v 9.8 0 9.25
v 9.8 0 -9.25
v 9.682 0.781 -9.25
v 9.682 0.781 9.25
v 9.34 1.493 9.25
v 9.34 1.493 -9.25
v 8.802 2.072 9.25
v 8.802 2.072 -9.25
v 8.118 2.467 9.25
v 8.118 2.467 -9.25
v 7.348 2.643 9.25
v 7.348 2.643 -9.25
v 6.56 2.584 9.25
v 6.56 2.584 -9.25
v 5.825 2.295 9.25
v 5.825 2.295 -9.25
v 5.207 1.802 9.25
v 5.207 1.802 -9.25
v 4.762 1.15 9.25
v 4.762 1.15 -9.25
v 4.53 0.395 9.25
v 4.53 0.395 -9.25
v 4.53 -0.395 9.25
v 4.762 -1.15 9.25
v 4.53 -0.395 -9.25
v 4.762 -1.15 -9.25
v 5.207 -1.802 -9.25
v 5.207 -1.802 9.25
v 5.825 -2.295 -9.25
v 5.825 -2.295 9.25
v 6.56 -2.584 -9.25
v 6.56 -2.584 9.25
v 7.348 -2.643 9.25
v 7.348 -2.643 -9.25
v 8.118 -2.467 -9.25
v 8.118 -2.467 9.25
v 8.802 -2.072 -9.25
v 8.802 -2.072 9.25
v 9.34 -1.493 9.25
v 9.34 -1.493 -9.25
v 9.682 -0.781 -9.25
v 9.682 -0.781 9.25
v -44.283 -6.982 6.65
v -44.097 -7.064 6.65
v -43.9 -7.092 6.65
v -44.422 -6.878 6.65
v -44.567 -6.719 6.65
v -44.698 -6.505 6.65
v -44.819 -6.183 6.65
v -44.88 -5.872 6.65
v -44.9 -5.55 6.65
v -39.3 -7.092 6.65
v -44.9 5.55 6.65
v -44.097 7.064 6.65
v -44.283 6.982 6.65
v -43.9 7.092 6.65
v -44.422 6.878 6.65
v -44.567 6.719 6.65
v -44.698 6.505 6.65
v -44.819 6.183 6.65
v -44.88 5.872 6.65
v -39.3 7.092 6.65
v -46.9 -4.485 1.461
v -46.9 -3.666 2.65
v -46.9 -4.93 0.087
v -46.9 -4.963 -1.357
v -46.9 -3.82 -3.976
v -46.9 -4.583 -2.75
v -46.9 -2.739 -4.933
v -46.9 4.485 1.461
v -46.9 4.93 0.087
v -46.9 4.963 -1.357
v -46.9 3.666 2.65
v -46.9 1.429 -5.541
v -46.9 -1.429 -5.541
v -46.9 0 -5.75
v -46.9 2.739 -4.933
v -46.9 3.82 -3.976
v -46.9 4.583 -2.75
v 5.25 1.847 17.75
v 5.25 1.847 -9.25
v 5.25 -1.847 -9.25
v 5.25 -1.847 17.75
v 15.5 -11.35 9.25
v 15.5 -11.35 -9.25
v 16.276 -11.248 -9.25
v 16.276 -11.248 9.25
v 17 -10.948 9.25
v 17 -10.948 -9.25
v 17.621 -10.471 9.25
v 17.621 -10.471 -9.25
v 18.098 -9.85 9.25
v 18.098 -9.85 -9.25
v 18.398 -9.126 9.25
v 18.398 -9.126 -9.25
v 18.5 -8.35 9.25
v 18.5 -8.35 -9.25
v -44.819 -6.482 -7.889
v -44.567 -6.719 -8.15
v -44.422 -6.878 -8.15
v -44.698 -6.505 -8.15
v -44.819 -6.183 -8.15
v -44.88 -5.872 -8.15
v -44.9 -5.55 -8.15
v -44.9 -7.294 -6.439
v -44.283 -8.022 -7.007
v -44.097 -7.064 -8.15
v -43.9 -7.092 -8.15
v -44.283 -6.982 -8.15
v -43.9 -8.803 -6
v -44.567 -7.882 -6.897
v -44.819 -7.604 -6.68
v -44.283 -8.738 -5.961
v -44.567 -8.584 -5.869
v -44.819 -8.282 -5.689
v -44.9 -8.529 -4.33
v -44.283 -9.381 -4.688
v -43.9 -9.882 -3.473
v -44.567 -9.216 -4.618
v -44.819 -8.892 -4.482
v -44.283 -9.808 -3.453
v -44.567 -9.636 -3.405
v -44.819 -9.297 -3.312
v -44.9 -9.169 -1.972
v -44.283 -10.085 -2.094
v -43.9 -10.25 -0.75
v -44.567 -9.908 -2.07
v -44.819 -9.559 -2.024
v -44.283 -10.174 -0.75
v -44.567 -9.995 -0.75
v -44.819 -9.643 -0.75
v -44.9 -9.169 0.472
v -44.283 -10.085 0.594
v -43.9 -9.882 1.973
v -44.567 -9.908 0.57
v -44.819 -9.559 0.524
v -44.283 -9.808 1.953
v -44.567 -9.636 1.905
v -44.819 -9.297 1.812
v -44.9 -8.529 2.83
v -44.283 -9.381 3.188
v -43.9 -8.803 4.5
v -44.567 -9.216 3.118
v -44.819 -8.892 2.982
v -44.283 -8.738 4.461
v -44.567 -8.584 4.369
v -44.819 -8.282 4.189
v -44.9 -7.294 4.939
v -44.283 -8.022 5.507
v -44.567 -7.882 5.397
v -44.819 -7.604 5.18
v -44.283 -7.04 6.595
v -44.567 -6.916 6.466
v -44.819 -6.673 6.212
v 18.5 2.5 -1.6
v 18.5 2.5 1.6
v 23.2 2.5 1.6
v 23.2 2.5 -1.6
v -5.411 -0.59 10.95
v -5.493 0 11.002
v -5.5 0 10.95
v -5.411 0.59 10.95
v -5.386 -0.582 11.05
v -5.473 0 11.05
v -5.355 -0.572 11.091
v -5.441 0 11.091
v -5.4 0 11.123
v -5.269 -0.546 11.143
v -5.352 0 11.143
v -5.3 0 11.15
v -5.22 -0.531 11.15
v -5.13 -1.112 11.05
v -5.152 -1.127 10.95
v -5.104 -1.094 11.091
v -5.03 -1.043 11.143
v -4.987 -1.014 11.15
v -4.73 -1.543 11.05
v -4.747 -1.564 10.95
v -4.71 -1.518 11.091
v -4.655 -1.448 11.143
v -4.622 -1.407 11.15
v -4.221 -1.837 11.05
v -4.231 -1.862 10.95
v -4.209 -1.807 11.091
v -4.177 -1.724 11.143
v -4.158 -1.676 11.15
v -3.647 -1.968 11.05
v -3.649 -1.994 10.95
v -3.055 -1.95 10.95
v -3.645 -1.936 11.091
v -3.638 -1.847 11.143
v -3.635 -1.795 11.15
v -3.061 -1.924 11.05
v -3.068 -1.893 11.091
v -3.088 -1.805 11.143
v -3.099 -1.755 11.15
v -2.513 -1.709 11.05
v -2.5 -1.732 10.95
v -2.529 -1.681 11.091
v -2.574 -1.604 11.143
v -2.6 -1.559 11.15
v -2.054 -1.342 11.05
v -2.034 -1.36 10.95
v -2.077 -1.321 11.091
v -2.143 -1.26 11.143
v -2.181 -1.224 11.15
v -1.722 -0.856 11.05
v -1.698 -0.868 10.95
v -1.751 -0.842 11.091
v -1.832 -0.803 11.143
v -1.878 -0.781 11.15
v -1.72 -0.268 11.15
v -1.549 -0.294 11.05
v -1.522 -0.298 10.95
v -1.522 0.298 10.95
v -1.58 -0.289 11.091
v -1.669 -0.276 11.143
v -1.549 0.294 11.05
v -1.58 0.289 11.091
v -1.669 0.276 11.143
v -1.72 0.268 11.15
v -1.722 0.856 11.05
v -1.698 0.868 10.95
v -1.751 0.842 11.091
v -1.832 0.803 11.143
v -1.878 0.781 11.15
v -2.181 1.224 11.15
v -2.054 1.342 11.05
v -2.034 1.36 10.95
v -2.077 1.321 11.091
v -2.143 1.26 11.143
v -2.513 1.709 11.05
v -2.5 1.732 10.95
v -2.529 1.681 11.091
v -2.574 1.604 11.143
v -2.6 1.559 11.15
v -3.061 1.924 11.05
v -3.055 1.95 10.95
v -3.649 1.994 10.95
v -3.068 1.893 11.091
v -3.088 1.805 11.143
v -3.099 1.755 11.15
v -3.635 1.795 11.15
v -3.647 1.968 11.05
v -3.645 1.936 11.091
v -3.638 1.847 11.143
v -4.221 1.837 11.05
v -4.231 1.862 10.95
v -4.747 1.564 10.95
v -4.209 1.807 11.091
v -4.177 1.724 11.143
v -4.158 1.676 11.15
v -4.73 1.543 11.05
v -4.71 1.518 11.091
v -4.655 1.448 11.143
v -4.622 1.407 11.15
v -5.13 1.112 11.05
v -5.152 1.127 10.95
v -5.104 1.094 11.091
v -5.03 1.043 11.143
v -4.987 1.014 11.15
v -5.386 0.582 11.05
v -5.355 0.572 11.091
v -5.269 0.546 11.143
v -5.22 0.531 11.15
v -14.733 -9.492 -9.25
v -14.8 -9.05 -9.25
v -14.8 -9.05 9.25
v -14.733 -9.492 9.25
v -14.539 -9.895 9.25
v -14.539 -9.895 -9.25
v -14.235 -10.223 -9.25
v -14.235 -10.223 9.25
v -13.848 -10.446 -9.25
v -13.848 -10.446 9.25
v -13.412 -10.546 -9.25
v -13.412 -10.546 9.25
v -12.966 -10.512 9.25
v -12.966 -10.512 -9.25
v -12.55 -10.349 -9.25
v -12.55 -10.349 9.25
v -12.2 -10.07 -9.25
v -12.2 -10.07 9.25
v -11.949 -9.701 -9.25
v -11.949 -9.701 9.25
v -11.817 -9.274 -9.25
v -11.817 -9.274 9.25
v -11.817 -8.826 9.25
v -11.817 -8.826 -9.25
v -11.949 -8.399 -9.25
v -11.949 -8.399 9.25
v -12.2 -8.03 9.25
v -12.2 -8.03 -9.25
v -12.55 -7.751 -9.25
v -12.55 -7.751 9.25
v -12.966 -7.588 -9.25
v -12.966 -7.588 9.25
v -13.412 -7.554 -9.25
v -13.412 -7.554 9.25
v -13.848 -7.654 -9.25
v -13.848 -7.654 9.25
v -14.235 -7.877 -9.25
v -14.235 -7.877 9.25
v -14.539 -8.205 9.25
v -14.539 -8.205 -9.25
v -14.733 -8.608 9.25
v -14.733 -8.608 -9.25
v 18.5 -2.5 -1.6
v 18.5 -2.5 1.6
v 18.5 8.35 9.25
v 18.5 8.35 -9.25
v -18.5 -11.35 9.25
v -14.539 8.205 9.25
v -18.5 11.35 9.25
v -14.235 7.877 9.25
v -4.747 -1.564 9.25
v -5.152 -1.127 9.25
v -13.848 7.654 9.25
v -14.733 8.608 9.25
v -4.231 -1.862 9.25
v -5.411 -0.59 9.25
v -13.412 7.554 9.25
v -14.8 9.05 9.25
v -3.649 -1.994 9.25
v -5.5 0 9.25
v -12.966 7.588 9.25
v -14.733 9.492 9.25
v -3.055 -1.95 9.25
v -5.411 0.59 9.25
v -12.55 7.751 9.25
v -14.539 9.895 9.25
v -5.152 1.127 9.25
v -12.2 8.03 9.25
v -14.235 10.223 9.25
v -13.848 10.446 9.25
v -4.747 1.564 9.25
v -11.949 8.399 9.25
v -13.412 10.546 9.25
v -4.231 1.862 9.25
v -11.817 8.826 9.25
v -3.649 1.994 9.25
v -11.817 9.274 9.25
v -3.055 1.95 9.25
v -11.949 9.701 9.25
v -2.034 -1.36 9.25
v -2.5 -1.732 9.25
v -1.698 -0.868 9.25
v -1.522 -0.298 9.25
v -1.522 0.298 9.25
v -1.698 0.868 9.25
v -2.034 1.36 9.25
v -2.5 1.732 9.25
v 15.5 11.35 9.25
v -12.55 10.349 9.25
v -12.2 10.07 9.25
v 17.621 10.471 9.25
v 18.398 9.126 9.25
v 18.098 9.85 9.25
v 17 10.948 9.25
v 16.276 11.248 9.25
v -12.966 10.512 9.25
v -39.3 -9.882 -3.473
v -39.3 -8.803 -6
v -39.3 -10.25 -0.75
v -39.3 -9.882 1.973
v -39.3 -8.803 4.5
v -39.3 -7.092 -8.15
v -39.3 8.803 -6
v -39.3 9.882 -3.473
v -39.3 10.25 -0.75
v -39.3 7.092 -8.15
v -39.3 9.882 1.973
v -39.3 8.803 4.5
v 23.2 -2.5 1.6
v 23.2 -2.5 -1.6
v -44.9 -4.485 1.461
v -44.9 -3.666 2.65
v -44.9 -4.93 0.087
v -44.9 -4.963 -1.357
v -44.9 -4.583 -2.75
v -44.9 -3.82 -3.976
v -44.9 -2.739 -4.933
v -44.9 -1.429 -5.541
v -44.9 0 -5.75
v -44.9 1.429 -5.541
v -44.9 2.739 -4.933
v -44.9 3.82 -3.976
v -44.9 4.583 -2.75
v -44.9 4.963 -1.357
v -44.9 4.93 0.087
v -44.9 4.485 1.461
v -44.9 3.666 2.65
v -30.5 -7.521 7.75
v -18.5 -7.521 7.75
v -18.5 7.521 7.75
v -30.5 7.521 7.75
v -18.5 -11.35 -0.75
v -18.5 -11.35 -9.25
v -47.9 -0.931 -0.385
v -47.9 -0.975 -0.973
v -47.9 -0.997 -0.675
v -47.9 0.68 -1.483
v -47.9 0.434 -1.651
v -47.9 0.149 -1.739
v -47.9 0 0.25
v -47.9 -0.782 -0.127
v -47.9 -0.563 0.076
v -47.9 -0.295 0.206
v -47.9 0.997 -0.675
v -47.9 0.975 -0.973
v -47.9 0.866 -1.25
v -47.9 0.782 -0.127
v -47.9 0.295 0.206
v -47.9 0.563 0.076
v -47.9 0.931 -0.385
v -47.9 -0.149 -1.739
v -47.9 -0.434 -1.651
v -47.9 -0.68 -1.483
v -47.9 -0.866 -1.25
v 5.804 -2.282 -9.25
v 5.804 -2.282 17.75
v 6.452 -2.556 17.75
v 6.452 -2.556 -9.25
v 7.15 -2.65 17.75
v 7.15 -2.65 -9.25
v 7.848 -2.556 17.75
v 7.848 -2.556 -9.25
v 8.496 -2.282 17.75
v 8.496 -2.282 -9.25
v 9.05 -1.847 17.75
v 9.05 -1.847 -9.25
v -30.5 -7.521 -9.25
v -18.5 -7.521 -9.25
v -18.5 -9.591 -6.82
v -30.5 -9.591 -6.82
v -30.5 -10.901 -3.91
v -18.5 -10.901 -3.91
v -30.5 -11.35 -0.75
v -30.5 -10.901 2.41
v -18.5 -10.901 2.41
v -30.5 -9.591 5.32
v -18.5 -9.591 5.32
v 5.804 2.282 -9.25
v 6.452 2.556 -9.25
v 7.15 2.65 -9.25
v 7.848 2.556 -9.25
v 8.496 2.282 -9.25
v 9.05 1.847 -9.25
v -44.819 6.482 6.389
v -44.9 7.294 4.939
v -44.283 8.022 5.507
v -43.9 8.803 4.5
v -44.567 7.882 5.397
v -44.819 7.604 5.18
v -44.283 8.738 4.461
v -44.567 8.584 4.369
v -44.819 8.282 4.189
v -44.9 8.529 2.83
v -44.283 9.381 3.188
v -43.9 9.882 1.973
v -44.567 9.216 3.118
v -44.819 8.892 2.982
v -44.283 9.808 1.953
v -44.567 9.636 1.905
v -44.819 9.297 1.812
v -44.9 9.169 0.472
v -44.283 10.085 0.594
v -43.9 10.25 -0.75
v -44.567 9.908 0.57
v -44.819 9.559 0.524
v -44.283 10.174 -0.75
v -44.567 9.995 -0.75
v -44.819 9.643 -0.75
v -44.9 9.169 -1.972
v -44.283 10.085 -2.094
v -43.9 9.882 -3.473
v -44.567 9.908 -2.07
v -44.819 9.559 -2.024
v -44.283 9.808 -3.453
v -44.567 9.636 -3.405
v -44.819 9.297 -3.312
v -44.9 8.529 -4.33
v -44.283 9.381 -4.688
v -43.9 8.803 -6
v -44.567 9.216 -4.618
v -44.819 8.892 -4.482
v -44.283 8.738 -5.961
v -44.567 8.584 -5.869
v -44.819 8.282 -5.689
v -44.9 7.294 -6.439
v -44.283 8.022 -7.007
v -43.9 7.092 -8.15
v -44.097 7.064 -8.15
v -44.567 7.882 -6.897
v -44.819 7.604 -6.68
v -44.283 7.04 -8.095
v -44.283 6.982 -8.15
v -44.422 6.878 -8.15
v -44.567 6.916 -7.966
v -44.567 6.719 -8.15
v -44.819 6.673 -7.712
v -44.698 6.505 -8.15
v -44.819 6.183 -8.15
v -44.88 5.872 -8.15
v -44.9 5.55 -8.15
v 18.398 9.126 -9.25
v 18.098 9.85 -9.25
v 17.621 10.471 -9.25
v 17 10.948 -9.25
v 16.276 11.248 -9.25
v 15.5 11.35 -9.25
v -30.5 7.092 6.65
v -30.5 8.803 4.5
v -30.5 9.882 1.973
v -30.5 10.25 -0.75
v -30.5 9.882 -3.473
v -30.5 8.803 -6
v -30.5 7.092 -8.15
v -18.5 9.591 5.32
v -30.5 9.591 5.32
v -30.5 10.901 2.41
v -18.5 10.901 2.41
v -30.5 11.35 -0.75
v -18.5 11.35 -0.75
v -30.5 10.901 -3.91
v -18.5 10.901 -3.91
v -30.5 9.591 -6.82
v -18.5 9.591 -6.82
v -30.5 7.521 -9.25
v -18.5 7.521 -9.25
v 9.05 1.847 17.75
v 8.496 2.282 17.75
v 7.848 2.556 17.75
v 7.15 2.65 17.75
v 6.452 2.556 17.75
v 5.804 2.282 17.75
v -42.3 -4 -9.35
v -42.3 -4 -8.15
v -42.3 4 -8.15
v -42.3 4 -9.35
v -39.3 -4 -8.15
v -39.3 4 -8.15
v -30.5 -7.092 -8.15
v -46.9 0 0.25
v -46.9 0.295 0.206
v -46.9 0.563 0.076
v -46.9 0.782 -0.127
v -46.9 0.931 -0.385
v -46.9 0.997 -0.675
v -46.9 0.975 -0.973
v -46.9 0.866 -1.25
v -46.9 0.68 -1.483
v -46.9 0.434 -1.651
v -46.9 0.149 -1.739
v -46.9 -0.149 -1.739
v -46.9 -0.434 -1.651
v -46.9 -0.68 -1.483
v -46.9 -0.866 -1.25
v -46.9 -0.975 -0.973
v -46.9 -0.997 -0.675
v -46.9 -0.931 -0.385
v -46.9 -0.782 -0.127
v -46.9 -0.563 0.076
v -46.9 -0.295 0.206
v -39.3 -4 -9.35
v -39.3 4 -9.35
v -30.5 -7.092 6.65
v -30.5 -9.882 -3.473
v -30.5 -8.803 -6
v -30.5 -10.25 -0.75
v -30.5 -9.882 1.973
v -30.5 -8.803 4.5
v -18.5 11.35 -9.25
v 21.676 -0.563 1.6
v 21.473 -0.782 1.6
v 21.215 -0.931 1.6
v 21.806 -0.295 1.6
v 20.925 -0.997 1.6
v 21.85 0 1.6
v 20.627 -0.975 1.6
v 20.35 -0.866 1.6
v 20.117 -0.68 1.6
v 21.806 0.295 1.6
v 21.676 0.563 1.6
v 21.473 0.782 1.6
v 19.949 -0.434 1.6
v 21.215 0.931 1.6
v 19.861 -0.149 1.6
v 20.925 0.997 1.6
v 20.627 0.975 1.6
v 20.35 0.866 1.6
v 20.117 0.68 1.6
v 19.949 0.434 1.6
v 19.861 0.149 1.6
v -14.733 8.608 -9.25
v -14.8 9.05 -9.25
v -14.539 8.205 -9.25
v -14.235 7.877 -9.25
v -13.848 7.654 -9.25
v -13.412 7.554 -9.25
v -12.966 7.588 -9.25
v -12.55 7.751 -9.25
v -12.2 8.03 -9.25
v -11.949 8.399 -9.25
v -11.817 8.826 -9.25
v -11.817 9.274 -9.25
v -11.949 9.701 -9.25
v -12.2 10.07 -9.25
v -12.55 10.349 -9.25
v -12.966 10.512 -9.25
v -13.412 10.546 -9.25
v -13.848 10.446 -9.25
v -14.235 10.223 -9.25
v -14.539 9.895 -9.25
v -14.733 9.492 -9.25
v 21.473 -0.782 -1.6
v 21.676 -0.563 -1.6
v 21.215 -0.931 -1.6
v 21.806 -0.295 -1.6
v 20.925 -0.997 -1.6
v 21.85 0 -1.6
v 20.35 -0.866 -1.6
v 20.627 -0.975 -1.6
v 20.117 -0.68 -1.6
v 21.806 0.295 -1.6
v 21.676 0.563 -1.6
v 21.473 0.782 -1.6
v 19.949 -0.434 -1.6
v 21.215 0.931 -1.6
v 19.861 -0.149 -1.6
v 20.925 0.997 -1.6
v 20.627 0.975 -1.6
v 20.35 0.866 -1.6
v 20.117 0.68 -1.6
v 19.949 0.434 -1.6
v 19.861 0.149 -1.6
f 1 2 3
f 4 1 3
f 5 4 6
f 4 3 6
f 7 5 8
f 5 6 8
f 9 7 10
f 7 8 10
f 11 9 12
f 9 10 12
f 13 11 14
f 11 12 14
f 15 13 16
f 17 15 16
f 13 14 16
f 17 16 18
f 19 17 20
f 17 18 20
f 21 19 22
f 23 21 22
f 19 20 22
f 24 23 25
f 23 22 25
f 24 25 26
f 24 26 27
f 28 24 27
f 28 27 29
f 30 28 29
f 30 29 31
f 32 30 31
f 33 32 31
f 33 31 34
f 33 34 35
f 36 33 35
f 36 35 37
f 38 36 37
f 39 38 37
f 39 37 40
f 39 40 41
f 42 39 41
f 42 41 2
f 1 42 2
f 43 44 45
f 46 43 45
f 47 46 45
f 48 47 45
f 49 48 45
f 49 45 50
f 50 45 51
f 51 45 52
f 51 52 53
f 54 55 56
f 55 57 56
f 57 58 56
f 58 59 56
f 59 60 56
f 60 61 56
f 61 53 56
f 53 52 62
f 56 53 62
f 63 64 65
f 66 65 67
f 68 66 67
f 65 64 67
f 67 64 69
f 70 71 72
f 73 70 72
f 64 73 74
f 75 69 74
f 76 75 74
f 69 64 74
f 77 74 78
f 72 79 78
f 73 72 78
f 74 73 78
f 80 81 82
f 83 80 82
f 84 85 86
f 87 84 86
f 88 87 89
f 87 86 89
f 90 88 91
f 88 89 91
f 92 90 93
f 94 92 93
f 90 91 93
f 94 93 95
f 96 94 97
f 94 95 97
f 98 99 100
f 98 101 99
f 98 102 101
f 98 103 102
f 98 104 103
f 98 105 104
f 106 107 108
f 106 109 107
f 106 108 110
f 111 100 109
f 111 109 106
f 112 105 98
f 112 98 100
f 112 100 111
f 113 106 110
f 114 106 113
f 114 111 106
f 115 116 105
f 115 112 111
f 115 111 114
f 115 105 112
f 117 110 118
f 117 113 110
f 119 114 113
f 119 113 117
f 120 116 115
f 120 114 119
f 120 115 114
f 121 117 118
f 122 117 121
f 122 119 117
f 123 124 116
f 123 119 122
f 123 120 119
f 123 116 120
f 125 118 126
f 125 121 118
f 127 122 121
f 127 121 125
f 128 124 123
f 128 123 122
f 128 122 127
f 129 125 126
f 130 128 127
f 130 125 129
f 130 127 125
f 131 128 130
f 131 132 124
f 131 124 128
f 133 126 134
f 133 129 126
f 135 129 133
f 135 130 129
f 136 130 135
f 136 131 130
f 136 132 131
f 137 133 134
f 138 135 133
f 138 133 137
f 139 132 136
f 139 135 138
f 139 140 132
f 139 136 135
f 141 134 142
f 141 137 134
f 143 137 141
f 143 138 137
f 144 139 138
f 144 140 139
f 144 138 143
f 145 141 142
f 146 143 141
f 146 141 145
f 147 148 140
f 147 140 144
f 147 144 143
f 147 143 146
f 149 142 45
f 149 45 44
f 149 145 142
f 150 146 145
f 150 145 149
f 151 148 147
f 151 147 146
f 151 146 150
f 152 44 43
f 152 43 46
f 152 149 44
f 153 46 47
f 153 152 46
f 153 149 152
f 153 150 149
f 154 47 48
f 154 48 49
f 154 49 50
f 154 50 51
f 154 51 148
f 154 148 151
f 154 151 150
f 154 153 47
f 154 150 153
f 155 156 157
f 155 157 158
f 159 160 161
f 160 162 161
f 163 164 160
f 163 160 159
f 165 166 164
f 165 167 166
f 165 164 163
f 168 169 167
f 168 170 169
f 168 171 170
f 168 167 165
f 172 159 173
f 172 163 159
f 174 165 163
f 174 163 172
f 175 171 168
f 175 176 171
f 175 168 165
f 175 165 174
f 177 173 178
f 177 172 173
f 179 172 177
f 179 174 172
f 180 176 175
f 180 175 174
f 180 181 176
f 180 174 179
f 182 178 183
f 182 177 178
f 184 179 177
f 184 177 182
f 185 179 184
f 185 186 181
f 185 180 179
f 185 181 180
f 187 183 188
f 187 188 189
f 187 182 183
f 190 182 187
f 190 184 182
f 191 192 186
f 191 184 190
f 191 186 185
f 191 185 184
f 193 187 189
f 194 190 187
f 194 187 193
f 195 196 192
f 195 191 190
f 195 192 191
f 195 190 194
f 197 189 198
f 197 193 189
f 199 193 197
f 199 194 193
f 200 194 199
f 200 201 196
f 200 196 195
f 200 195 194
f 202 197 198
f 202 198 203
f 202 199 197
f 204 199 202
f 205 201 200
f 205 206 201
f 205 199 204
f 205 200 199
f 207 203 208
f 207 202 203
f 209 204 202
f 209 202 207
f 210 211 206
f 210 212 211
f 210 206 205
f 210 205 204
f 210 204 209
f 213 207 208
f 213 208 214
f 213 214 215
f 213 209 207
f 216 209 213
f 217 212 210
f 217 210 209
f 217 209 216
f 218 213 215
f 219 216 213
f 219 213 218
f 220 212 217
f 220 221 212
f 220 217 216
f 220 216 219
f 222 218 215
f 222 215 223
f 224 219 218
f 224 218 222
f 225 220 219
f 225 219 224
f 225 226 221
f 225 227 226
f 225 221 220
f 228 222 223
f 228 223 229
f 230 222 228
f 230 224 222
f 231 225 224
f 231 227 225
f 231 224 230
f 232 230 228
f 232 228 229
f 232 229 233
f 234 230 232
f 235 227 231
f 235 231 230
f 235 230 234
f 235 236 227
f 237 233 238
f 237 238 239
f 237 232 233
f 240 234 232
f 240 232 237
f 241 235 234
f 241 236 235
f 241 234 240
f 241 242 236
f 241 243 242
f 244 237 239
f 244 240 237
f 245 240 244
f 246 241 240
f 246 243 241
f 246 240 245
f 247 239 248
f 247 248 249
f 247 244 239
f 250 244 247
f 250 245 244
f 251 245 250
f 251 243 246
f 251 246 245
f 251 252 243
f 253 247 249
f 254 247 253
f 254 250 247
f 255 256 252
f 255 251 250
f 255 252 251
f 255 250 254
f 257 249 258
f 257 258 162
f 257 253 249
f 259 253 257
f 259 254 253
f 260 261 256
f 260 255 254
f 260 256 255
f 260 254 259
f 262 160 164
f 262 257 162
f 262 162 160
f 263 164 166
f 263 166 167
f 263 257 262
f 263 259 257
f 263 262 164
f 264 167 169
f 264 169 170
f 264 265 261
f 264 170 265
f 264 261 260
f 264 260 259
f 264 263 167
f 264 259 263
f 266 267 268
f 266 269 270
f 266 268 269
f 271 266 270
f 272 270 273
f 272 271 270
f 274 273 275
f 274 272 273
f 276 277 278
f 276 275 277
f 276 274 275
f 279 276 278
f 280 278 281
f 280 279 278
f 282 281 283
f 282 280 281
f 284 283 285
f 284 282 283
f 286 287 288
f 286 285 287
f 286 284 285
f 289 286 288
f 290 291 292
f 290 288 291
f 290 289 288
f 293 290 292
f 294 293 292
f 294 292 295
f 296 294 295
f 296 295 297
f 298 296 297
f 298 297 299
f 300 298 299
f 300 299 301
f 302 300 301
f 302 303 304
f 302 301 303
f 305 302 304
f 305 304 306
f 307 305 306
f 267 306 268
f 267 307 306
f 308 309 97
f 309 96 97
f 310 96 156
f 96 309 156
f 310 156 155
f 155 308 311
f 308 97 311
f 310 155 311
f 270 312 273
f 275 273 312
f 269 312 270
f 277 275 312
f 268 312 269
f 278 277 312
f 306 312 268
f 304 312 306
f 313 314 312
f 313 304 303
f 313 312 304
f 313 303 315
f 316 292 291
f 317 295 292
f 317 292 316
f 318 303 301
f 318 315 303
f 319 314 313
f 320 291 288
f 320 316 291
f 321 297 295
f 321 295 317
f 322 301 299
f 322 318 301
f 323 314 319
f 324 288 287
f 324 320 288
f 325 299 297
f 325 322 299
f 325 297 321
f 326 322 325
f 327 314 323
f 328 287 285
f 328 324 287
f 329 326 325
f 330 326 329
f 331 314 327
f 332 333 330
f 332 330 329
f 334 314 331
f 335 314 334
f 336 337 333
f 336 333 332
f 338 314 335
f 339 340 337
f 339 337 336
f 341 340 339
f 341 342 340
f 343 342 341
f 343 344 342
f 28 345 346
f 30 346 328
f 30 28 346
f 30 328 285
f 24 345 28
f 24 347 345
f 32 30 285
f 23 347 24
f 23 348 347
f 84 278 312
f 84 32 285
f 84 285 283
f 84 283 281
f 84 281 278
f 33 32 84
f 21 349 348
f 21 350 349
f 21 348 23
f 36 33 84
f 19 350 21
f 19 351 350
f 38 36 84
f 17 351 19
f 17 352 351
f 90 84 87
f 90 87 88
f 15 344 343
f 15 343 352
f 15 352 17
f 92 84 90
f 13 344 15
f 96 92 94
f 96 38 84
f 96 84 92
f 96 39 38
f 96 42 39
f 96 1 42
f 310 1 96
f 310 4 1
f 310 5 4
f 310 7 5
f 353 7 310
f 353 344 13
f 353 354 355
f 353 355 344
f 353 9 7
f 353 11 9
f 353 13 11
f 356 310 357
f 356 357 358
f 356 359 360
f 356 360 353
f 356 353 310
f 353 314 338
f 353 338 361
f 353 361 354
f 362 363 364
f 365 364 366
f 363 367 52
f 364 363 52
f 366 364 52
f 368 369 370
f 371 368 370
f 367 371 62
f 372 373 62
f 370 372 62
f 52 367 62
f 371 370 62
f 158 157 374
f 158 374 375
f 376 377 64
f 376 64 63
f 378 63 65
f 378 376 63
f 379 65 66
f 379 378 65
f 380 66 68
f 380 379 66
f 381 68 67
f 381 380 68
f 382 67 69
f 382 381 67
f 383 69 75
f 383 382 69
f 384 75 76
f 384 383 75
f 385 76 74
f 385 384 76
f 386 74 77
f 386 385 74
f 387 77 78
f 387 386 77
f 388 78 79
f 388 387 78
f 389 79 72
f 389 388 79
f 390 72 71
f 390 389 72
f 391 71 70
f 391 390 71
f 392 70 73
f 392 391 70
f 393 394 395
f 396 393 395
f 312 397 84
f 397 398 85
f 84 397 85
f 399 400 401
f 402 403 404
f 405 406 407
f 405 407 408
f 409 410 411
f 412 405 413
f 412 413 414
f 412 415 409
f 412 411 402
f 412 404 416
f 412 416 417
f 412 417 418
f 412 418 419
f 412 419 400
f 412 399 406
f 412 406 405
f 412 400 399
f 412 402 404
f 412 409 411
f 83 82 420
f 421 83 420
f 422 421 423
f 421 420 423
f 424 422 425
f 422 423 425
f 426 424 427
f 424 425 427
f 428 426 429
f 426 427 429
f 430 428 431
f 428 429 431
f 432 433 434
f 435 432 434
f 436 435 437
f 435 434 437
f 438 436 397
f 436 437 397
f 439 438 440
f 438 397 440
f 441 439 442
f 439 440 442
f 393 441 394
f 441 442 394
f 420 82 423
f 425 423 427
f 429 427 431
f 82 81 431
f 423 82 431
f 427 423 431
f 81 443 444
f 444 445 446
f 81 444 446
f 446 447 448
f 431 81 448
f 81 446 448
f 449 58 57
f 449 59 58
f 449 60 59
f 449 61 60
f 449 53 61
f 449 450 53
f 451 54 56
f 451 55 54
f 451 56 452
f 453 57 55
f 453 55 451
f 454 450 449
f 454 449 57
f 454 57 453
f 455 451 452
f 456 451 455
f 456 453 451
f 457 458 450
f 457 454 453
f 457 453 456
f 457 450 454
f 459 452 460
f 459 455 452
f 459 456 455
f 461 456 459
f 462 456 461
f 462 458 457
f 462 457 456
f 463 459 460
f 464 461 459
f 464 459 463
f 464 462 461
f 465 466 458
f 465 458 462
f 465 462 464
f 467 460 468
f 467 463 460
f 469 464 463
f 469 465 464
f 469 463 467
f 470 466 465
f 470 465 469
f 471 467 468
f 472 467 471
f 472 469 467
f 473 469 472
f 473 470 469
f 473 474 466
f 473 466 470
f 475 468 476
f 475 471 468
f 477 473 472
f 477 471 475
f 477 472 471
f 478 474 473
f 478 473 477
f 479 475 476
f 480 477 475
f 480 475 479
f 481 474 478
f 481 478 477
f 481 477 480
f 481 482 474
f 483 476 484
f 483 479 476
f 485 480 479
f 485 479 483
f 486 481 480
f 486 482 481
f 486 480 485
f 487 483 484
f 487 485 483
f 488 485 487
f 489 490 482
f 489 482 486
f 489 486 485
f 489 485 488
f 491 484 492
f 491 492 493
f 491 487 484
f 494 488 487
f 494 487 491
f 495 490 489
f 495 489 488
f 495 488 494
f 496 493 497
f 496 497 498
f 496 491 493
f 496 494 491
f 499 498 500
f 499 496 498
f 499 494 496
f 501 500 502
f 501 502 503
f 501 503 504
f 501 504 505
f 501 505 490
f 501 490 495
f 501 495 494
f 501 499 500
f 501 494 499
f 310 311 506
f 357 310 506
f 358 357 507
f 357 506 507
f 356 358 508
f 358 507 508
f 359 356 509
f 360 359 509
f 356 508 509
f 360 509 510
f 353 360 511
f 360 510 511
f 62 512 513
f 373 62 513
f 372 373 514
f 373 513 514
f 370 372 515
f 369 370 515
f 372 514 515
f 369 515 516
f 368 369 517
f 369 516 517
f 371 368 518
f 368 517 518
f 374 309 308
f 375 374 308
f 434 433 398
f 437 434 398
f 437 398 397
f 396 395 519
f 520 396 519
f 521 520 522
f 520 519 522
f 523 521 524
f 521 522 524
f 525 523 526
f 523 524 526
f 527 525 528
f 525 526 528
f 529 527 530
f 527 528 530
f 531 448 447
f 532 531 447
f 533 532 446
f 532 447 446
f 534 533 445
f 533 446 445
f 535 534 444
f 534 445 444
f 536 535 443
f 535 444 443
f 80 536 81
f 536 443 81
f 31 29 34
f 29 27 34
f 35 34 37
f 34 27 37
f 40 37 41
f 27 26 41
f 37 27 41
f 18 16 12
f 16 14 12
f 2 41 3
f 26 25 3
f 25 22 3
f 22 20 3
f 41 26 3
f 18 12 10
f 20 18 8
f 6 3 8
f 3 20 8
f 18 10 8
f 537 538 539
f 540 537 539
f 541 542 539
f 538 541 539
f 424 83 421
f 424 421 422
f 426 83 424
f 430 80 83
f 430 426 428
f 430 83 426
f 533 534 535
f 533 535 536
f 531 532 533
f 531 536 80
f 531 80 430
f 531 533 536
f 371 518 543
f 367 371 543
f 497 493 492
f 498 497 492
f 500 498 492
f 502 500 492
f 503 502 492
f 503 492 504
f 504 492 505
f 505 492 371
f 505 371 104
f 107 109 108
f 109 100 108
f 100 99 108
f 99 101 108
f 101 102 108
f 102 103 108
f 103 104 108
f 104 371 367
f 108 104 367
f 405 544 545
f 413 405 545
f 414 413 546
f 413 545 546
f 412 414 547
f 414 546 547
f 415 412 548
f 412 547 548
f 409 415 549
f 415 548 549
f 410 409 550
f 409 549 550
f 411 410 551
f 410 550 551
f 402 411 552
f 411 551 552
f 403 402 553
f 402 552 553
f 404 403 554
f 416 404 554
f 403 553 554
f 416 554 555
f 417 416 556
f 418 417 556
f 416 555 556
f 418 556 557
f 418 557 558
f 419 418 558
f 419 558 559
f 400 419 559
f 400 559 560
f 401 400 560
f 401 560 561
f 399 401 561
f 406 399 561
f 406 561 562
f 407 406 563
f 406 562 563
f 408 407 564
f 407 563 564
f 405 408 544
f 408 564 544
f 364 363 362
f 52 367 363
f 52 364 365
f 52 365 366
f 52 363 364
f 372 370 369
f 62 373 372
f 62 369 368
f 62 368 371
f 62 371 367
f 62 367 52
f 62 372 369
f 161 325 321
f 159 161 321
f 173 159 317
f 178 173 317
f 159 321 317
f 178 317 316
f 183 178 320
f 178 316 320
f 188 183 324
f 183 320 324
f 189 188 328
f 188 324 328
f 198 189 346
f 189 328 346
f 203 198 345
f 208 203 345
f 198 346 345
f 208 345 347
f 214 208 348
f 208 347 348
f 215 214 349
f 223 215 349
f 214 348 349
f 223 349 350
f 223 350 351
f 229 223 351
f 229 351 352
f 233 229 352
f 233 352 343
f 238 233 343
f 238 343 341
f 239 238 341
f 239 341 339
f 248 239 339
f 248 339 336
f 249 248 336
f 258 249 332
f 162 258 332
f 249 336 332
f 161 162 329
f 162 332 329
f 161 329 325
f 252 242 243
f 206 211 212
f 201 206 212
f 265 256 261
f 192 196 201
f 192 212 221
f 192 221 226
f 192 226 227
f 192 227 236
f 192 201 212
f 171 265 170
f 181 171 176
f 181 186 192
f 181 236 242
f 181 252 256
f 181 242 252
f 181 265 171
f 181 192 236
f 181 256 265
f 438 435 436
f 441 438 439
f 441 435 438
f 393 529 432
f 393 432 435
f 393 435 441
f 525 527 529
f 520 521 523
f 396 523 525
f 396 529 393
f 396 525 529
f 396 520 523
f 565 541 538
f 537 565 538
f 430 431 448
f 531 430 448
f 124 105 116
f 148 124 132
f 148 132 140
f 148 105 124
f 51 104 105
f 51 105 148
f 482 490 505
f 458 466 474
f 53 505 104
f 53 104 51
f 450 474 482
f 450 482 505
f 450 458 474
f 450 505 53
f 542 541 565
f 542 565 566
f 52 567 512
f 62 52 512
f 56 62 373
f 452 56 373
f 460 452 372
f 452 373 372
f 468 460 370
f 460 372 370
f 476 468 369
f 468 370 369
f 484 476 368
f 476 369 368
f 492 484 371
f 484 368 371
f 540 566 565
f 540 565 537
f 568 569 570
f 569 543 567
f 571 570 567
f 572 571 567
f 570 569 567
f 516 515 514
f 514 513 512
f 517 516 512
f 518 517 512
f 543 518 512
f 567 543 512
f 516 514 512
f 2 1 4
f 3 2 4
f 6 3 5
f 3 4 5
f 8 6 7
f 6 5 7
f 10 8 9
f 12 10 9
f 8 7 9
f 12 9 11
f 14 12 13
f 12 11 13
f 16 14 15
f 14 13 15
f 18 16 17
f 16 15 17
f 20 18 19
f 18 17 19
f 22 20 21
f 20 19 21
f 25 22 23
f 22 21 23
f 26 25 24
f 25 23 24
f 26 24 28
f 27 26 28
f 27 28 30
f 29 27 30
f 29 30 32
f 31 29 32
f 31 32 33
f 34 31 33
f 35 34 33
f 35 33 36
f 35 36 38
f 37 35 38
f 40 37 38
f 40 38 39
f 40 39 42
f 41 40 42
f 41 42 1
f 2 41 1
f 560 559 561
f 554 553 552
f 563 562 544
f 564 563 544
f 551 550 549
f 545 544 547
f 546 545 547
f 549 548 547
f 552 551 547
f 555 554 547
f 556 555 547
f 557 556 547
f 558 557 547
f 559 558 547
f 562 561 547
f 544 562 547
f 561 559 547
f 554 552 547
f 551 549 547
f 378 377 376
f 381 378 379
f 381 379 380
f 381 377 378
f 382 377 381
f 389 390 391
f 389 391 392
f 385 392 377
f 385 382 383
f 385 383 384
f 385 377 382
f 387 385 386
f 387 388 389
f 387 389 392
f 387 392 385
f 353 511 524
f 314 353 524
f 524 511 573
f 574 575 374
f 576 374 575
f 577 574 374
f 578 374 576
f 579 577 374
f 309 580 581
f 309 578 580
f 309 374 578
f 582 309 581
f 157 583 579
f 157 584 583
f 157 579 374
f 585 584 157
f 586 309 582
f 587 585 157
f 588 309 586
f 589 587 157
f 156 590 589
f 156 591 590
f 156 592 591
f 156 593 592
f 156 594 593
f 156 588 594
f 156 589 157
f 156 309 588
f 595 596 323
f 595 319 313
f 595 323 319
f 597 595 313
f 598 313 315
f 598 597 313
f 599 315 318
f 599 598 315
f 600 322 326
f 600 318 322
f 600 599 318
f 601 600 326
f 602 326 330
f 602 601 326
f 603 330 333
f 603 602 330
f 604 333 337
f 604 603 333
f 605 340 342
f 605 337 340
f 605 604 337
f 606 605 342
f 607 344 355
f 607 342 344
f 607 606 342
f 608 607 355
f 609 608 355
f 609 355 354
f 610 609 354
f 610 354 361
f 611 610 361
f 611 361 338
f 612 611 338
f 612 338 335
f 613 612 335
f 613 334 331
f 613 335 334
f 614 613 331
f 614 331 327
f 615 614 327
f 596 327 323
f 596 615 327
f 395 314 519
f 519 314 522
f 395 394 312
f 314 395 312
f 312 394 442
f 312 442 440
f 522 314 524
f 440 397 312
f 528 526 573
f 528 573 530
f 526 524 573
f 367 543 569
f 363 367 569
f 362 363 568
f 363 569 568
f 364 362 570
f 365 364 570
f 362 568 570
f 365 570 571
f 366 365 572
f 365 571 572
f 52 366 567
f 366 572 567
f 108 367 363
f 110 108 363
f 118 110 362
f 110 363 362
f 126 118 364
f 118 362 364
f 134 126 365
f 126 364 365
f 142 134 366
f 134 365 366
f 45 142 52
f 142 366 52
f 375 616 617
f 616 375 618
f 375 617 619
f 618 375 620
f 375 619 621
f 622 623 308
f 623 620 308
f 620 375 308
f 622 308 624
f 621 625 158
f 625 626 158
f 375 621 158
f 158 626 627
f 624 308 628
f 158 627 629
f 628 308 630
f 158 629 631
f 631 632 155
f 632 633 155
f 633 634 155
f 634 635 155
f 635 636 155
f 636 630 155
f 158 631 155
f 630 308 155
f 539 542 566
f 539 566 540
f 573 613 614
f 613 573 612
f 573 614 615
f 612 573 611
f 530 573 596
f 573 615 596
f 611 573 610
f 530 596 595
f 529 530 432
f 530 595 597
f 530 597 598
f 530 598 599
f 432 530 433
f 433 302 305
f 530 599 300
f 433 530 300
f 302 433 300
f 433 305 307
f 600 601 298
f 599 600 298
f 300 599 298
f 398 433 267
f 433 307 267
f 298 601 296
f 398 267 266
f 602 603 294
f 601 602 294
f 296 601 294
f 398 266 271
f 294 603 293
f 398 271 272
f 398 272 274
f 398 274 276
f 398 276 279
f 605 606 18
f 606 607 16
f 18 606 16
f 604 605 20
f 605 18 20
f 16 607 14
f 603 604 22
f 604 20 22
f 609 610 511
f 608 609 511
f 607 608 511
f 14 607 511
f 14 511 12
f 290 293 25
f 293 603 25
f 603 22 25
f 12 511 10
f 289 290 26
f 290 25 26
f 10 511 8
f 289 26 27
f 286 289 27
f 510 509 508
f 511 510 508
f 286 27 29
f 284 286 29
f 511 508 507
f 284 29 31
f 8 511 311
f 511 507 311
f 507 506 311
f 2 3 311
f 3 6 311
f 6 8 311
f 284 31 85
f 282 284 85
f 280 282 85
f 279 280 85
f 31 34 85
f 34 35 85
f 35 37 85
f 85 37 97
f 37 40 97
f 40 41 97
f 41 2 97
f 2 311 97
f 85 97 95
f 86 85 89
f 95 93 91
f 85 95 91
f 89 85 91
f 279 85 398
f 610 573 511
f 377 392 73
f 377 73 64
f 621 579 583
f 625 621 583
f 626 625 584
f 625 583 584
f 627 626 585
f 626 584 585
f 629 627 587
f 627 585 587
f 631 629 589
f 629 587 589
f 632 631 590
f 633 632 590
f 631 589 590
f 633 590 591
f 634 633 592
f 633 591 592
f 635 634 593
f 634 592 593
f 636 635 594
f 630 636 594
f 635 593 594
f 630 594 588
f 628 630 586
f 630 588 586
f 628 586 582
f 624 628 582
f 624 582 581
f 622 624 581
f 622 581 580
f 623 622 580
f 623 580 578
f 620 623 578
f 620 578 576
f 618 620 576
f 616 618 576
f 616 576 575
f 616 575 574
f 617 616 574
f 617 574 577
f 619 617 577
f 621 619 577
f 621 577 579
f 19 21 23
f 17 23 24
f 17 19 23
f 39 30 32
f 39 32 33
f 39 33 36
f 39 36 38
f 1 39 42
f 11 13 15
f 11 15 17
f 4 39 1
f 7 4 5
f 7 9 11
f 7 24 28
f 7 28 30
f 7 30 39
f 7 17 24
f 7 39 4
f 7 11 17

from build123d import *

# Parameters (mm, degrees)
SALIENTE_EXTRUIR1_DEPTH       = 9.25
SALIENTE_EXTRUIR1_DEPTH_BACK  = 9.25
SALIENTE_EXTRUIR2_DEPTH       = 12
CROQUIS3_W                    = 3.2
CROQUIS3_H                    = 5
SALIENTE_EXTRUIR3_DEPTH       = 4.7
CORTAR_EXTRUIR1_DEPTH         = 28
CORTAR_EXTRUIR1_DEPTH_BACK    = 17.7
CROQUIS4_R                    = 1.5
CROQUIS5_R                    = 2
SALIENTE_EXTRUIR4_DEPTH       = 1.9
REDONDEO1_R                   = 0.2
CROQUIS6_R                    = 2.65
CORTAR_EXTRUIR2_DEPTH         = 23.9
SALIENTE_EXTRUIR5_DEPTH       = 8.8
SALIENTE_EXTRUIR6_DEPTH       = 5.6
REDONDEO2_R                   = 1
SALIENTE_EXTRUIR7_DEPTH       = 2
CROQUIS12_R                   = 1
SALIENTE_EXTRUIR8_DEPTH       = 1
CROQUIS13_W                   = 3
CROQUIS13_H                   = 8
SALIENTE_EXTRUIR9_DEPTH       = 1.2
CROQUIS14_R                   = 1
CORTAR_EXTRUIR3_DEPTH         = 4.2
SALIENTE_EXTRUIR10_DEPTH      = 17.75
SALIENTE_EXTRUIR10_DEPTH_BACK = 20.25
SALIENTE_EXTRUIR11_DEPTH      = 9.25
SALIENTE_EXTRUIR11_DEPTH_BACK = 12.25
CROQUIS16_R                   = 2.65
SKETCH_1_W                    = 9.867369552
SKETCH_1_H                    = 12.675768788
CUT_EXTRUDE_1_DEPTH           = 32


with BuildPart() as part:
    # Croquis1 → Saliente-Extruir1 (new, two sides: drawn at the far end of the back side and taken through both)
    with BuildSketch(Plane.XY.offset(-SALIENTE_EXTRUIR1_DEPTH_BACK)):
        with BuildLine():
            Line((-18.5, -11.35), (15.5, -11.35))
            ThreePointArc((15.5, -11.35), (17.621320344, -10.471320344), (18.5, -8.35))
            Line((18.5, -8.35), (18.5, 8.35))
            ThreePointArc((18.5, 8.35), (17.621320344, 10.471320344), (15.5, 11.35))
            Line((15.5, 11.35), (-18.5, 11.35))
            Line((-18.5, 11.35), (-18.5, -11.35))
        make_face()
    extrude(amount=SALIENTE_EXTRUIR1_DEPTH + SALIENTE_EXTRUIR1_DEPTH_BACK)

    # Croquis2 → Saliente-Extruir2 (add)
    with BuildSketch(Plane.ZY.offset(18.5)):
        with BuildLine():
            Line((7.75, -7.521469271), (7.75, 7.521469271))
            ThreePointArc((7.75, 7.521469271), (-0.75, 11.35), (-9.25, 7.521469271))
            Line((-9.25, 7.521469271), (-9.25, -7.521469271))
            ThreePointArc((-9.25, -7.521469271), (-0.75, -11.35), (7.75, -7.521469271))
        make_face()
    extrude(amount=SALIENTE_EXTRUIR2_DEPTH)

    # Croquis3 → Saliente-Extruir3 (add)
    with BuildSketch(Plane(origin=(18.5, 0, 0), x_dir=(0, 0, -1), z_dir=(1, 0, 0))):
        Rectangle(CROQUIS3_W, CROQUIS3_H)
    extrude(amount=SALIENTE_EXTRUIR3_DEPTH)

    # Croquis4 → Cortar-Extruir1 (cut, two sides: drawn at the far end of the back side and taken through both)
    with BuildSketch(Plane.XY.offset(-CORTAR_EXTRUIR1_DEPTH_BACK)):
        with Locations(Location((-13.3, 9.05, 0), (0, 0, 180))):
            Circle(CROQUIS4_R)
        with Locations(Location((-13.3, -9.05, 0), (0, 0, 180))):
            Circle(CROQUIS4_R)
    extrude(amount=CORTAR_EXTRUIR1_DEPTH + CORTAR_EXTRUIR1_DEPTH_BACK, mode=Mode.SUBTRACT)

    # Croquis5 → Saliente-Extruir4 (add)
    with BuildSketch(Plane.XY.offset(9.25)):
        with Locations(Location((-3.5, 0, 0), (0, 0, 180))):
            Circle(CROQUIS5_R)
    extrude(amount=SALIENTE_EXTRUIR4_DEPTH)

    # Redondeo1
    redondeo1_edges = [part.edges().sort_by_distance(p)[0] for p in [
        (-1.5, 0, 11.15),
    ]]
    fillet(redondeo1_edges, radius=REDONDEO1_R)

    # Croquis6 → Cortar-Extruir2 (cut)
    with BuildSketch(Plane.XY.offset(9.25)):
        with Locations((7.15, 0)):
            Circle(CROQUIS6_R)
    extrude(amount=-CORTAR_EXTRUIR2_DEPTH, mode=Mode.SUBTRACT)

    # Croquis14 → Cortar-Extruir3 (cut)
    with BuildSketch(Plane.XY.offset(1.6)):
        with Locations((20.85, 0)):
            Circle(CROQUIS14_R)
    extrude(amount=-CORTAR_EXTRUIR3_DEPTH, mode=Mode.SUBTRACT)


with BuildPart() as body_2:
    # Croquis9 → Saliente-Extruir5 (new body)
    with BuildSketch(Plane.ZY.offset(30.5)):
        with BuildLine():
            Line((6.65, -7.092425537), (6.65, 7.092425537))
            ThreePointArc((6.65, 7.092425537), (-0.75, 10.25), (-8.15, 7.092425537))
            Line((-8.15, 7.092425537), (-8.15, -7.092425537))
            ThreePointArc((-8.15, -7.092425537), (-0.75, -10.25), (6.65, -7.092425537))
        make_face()
    extrude(amount=SALIENTE_EXTRUIR5_DEPTH)


with BuildPart() as body_3:
    # Croquis10 → Saliente-Extruir6 (new body)
    with BuildSketch(Plane.ZY.offset(39.3)):
        with BuildLine():
            Line((-8.15, 7.092425537), (-8.15, -7.092425537))
            ThreePointArc((-8.15, -7.092425537), (-0.75, -10.25), (6.65, -7.092425537))
            Line((6.65, -7.092425537), (6.65, 7.092425537))
            ThreePointArc((6.65, 7.092425537), (-0.75, 10.25), (-8.15, 7.092425537))
        make_face()
    extrude(amount=SALIENTE_EXTRUIR6_DEPTH)

    # Redondeo2
    redondeo2_edges = [body_3.edges().sort_by_distance(p)[0] for p in [
        (-44.9, -10.25, -0.75),
        (-44.9, 10.25, -0.75),
    ]]
    fillet(redondeo2_edges, radius=REDONDEO2_R)


with BuildPart() as body_4:
    # Croquis11 → Saliente-Extruir7 (new body)
    with BuildSketch(Plane.ZY.offset(44.9)):
        with BuildLine():
            Line((2.65, 3.666060556), (2.65, -3.666060556))
            ThreePointArc((2.65, -3.666060556), (-5.75, 0), (2.65, 3.666060556))
        make_face()
    extrude(amount=SALIENTE_EXTRUIR7_DEPTH)


with BuildPart() as body_5:
    # Croquis12 → Saliente-Extruir8 (new body)
    with BuildSketch(Plane.ZY.offset(46.9)):
        with Locations((-0.75, 0)):
            Circle(CROQUIS12_R)
    extrude(amount=SALIENTE_EXTRUIR8_DEPTH)


with BuildPart() as body_6:
    # Croquis13 → Saliente-Extruir9 (new body)
    with BuildSketch(Plane(origin=(0, 0, -8.15), x_dir=(-1, 0, 0), z_dir=(0, 0, -1))):
        with Locations((40.8, 0)):
            Rectangle(CROQUIS13_W, CROQUIS13_H)
    extrude(amount=SALIENTE_EXTRUIR9_DEPTH)


with BuildPart() as body_7:
    # Croquis15 → Saliente-Extruir10 (new, two sides: drawn at the far end of the back side and taken through both)
    with BuildSketch(Plane.XY.offset(-SALIENTE_EXTRUIR10_DEPTH_BACK)):
        with BuildLine():
            Line((9.05, -1.84729532), (9.05, 1.84729532))
            ThreePointArc((9.05, 1.84729532), (7.15, 2.65), (5.25, 1.84729532))
            Line((5.25, 1.84729532), (5.25, -1.84729532))
            ThreePointArc((5.25, -1.84729532), (7.15, -2.65), (9.05, -1.84729532))
        make_face()
    extrude(amount=SALIENTE_EXTRUIR10_DEPTH + SALIENTE_EXTRUIR10_DEPTH_BACK)


with BuildPart() as body_8:
    # Croquis16 → Saliente-Extruir11 (new, two sides: drawn at the far end of the back side and taken through both)
    with BuildSketch(Plane.XY.offset(-SALIENTE_EXTRUIR11_DEPTH_BACK)):
        with Locations((7.15, 0)):
            Circle(CROQUIS16_R)
    extrude(amount=SALIENTE_EXTRUIR11_DEPTH + SALIENTE_EXTRUIR11_DEPTH_BACK)


with BuildPart() as cut_extrude_1_tool:
    # 草图1 → 切除-拉伸1 (new body)
    with BuildSketch(Plane(origin=(0, 11.35, 0), x_dir=(1, 0, 0), z_dir=(0, 1, 0))):
        with Locations((7.089458597, 15.587884394)):
            Rectangle(SKETCH_1_W, SKETCH_1_H)
    extrude(amount=-CUT_EXTRUDE_1_DEPTH)


with BuildPart() as body_7_1:
    add(body_7.part)

    # 切除-拉伸1: cut by cut_extrude_1_tool
    add(cut_extrude_1_tool.part, mode=Mode.SUBTRACT)


with BuildPart() as body_8_1:
    add(body_8.part)

    # 切除-拉伸1: cut by cut_extrude_1_tool
    add(cut_extrude_1_tool.part, mode=Mode.SUBTRACT)


solid = Compound([part.part, body_2.part, body_3.part, body_4.part, body_5.part, body_6.part, body_7_1.part, body_8_1.part])
